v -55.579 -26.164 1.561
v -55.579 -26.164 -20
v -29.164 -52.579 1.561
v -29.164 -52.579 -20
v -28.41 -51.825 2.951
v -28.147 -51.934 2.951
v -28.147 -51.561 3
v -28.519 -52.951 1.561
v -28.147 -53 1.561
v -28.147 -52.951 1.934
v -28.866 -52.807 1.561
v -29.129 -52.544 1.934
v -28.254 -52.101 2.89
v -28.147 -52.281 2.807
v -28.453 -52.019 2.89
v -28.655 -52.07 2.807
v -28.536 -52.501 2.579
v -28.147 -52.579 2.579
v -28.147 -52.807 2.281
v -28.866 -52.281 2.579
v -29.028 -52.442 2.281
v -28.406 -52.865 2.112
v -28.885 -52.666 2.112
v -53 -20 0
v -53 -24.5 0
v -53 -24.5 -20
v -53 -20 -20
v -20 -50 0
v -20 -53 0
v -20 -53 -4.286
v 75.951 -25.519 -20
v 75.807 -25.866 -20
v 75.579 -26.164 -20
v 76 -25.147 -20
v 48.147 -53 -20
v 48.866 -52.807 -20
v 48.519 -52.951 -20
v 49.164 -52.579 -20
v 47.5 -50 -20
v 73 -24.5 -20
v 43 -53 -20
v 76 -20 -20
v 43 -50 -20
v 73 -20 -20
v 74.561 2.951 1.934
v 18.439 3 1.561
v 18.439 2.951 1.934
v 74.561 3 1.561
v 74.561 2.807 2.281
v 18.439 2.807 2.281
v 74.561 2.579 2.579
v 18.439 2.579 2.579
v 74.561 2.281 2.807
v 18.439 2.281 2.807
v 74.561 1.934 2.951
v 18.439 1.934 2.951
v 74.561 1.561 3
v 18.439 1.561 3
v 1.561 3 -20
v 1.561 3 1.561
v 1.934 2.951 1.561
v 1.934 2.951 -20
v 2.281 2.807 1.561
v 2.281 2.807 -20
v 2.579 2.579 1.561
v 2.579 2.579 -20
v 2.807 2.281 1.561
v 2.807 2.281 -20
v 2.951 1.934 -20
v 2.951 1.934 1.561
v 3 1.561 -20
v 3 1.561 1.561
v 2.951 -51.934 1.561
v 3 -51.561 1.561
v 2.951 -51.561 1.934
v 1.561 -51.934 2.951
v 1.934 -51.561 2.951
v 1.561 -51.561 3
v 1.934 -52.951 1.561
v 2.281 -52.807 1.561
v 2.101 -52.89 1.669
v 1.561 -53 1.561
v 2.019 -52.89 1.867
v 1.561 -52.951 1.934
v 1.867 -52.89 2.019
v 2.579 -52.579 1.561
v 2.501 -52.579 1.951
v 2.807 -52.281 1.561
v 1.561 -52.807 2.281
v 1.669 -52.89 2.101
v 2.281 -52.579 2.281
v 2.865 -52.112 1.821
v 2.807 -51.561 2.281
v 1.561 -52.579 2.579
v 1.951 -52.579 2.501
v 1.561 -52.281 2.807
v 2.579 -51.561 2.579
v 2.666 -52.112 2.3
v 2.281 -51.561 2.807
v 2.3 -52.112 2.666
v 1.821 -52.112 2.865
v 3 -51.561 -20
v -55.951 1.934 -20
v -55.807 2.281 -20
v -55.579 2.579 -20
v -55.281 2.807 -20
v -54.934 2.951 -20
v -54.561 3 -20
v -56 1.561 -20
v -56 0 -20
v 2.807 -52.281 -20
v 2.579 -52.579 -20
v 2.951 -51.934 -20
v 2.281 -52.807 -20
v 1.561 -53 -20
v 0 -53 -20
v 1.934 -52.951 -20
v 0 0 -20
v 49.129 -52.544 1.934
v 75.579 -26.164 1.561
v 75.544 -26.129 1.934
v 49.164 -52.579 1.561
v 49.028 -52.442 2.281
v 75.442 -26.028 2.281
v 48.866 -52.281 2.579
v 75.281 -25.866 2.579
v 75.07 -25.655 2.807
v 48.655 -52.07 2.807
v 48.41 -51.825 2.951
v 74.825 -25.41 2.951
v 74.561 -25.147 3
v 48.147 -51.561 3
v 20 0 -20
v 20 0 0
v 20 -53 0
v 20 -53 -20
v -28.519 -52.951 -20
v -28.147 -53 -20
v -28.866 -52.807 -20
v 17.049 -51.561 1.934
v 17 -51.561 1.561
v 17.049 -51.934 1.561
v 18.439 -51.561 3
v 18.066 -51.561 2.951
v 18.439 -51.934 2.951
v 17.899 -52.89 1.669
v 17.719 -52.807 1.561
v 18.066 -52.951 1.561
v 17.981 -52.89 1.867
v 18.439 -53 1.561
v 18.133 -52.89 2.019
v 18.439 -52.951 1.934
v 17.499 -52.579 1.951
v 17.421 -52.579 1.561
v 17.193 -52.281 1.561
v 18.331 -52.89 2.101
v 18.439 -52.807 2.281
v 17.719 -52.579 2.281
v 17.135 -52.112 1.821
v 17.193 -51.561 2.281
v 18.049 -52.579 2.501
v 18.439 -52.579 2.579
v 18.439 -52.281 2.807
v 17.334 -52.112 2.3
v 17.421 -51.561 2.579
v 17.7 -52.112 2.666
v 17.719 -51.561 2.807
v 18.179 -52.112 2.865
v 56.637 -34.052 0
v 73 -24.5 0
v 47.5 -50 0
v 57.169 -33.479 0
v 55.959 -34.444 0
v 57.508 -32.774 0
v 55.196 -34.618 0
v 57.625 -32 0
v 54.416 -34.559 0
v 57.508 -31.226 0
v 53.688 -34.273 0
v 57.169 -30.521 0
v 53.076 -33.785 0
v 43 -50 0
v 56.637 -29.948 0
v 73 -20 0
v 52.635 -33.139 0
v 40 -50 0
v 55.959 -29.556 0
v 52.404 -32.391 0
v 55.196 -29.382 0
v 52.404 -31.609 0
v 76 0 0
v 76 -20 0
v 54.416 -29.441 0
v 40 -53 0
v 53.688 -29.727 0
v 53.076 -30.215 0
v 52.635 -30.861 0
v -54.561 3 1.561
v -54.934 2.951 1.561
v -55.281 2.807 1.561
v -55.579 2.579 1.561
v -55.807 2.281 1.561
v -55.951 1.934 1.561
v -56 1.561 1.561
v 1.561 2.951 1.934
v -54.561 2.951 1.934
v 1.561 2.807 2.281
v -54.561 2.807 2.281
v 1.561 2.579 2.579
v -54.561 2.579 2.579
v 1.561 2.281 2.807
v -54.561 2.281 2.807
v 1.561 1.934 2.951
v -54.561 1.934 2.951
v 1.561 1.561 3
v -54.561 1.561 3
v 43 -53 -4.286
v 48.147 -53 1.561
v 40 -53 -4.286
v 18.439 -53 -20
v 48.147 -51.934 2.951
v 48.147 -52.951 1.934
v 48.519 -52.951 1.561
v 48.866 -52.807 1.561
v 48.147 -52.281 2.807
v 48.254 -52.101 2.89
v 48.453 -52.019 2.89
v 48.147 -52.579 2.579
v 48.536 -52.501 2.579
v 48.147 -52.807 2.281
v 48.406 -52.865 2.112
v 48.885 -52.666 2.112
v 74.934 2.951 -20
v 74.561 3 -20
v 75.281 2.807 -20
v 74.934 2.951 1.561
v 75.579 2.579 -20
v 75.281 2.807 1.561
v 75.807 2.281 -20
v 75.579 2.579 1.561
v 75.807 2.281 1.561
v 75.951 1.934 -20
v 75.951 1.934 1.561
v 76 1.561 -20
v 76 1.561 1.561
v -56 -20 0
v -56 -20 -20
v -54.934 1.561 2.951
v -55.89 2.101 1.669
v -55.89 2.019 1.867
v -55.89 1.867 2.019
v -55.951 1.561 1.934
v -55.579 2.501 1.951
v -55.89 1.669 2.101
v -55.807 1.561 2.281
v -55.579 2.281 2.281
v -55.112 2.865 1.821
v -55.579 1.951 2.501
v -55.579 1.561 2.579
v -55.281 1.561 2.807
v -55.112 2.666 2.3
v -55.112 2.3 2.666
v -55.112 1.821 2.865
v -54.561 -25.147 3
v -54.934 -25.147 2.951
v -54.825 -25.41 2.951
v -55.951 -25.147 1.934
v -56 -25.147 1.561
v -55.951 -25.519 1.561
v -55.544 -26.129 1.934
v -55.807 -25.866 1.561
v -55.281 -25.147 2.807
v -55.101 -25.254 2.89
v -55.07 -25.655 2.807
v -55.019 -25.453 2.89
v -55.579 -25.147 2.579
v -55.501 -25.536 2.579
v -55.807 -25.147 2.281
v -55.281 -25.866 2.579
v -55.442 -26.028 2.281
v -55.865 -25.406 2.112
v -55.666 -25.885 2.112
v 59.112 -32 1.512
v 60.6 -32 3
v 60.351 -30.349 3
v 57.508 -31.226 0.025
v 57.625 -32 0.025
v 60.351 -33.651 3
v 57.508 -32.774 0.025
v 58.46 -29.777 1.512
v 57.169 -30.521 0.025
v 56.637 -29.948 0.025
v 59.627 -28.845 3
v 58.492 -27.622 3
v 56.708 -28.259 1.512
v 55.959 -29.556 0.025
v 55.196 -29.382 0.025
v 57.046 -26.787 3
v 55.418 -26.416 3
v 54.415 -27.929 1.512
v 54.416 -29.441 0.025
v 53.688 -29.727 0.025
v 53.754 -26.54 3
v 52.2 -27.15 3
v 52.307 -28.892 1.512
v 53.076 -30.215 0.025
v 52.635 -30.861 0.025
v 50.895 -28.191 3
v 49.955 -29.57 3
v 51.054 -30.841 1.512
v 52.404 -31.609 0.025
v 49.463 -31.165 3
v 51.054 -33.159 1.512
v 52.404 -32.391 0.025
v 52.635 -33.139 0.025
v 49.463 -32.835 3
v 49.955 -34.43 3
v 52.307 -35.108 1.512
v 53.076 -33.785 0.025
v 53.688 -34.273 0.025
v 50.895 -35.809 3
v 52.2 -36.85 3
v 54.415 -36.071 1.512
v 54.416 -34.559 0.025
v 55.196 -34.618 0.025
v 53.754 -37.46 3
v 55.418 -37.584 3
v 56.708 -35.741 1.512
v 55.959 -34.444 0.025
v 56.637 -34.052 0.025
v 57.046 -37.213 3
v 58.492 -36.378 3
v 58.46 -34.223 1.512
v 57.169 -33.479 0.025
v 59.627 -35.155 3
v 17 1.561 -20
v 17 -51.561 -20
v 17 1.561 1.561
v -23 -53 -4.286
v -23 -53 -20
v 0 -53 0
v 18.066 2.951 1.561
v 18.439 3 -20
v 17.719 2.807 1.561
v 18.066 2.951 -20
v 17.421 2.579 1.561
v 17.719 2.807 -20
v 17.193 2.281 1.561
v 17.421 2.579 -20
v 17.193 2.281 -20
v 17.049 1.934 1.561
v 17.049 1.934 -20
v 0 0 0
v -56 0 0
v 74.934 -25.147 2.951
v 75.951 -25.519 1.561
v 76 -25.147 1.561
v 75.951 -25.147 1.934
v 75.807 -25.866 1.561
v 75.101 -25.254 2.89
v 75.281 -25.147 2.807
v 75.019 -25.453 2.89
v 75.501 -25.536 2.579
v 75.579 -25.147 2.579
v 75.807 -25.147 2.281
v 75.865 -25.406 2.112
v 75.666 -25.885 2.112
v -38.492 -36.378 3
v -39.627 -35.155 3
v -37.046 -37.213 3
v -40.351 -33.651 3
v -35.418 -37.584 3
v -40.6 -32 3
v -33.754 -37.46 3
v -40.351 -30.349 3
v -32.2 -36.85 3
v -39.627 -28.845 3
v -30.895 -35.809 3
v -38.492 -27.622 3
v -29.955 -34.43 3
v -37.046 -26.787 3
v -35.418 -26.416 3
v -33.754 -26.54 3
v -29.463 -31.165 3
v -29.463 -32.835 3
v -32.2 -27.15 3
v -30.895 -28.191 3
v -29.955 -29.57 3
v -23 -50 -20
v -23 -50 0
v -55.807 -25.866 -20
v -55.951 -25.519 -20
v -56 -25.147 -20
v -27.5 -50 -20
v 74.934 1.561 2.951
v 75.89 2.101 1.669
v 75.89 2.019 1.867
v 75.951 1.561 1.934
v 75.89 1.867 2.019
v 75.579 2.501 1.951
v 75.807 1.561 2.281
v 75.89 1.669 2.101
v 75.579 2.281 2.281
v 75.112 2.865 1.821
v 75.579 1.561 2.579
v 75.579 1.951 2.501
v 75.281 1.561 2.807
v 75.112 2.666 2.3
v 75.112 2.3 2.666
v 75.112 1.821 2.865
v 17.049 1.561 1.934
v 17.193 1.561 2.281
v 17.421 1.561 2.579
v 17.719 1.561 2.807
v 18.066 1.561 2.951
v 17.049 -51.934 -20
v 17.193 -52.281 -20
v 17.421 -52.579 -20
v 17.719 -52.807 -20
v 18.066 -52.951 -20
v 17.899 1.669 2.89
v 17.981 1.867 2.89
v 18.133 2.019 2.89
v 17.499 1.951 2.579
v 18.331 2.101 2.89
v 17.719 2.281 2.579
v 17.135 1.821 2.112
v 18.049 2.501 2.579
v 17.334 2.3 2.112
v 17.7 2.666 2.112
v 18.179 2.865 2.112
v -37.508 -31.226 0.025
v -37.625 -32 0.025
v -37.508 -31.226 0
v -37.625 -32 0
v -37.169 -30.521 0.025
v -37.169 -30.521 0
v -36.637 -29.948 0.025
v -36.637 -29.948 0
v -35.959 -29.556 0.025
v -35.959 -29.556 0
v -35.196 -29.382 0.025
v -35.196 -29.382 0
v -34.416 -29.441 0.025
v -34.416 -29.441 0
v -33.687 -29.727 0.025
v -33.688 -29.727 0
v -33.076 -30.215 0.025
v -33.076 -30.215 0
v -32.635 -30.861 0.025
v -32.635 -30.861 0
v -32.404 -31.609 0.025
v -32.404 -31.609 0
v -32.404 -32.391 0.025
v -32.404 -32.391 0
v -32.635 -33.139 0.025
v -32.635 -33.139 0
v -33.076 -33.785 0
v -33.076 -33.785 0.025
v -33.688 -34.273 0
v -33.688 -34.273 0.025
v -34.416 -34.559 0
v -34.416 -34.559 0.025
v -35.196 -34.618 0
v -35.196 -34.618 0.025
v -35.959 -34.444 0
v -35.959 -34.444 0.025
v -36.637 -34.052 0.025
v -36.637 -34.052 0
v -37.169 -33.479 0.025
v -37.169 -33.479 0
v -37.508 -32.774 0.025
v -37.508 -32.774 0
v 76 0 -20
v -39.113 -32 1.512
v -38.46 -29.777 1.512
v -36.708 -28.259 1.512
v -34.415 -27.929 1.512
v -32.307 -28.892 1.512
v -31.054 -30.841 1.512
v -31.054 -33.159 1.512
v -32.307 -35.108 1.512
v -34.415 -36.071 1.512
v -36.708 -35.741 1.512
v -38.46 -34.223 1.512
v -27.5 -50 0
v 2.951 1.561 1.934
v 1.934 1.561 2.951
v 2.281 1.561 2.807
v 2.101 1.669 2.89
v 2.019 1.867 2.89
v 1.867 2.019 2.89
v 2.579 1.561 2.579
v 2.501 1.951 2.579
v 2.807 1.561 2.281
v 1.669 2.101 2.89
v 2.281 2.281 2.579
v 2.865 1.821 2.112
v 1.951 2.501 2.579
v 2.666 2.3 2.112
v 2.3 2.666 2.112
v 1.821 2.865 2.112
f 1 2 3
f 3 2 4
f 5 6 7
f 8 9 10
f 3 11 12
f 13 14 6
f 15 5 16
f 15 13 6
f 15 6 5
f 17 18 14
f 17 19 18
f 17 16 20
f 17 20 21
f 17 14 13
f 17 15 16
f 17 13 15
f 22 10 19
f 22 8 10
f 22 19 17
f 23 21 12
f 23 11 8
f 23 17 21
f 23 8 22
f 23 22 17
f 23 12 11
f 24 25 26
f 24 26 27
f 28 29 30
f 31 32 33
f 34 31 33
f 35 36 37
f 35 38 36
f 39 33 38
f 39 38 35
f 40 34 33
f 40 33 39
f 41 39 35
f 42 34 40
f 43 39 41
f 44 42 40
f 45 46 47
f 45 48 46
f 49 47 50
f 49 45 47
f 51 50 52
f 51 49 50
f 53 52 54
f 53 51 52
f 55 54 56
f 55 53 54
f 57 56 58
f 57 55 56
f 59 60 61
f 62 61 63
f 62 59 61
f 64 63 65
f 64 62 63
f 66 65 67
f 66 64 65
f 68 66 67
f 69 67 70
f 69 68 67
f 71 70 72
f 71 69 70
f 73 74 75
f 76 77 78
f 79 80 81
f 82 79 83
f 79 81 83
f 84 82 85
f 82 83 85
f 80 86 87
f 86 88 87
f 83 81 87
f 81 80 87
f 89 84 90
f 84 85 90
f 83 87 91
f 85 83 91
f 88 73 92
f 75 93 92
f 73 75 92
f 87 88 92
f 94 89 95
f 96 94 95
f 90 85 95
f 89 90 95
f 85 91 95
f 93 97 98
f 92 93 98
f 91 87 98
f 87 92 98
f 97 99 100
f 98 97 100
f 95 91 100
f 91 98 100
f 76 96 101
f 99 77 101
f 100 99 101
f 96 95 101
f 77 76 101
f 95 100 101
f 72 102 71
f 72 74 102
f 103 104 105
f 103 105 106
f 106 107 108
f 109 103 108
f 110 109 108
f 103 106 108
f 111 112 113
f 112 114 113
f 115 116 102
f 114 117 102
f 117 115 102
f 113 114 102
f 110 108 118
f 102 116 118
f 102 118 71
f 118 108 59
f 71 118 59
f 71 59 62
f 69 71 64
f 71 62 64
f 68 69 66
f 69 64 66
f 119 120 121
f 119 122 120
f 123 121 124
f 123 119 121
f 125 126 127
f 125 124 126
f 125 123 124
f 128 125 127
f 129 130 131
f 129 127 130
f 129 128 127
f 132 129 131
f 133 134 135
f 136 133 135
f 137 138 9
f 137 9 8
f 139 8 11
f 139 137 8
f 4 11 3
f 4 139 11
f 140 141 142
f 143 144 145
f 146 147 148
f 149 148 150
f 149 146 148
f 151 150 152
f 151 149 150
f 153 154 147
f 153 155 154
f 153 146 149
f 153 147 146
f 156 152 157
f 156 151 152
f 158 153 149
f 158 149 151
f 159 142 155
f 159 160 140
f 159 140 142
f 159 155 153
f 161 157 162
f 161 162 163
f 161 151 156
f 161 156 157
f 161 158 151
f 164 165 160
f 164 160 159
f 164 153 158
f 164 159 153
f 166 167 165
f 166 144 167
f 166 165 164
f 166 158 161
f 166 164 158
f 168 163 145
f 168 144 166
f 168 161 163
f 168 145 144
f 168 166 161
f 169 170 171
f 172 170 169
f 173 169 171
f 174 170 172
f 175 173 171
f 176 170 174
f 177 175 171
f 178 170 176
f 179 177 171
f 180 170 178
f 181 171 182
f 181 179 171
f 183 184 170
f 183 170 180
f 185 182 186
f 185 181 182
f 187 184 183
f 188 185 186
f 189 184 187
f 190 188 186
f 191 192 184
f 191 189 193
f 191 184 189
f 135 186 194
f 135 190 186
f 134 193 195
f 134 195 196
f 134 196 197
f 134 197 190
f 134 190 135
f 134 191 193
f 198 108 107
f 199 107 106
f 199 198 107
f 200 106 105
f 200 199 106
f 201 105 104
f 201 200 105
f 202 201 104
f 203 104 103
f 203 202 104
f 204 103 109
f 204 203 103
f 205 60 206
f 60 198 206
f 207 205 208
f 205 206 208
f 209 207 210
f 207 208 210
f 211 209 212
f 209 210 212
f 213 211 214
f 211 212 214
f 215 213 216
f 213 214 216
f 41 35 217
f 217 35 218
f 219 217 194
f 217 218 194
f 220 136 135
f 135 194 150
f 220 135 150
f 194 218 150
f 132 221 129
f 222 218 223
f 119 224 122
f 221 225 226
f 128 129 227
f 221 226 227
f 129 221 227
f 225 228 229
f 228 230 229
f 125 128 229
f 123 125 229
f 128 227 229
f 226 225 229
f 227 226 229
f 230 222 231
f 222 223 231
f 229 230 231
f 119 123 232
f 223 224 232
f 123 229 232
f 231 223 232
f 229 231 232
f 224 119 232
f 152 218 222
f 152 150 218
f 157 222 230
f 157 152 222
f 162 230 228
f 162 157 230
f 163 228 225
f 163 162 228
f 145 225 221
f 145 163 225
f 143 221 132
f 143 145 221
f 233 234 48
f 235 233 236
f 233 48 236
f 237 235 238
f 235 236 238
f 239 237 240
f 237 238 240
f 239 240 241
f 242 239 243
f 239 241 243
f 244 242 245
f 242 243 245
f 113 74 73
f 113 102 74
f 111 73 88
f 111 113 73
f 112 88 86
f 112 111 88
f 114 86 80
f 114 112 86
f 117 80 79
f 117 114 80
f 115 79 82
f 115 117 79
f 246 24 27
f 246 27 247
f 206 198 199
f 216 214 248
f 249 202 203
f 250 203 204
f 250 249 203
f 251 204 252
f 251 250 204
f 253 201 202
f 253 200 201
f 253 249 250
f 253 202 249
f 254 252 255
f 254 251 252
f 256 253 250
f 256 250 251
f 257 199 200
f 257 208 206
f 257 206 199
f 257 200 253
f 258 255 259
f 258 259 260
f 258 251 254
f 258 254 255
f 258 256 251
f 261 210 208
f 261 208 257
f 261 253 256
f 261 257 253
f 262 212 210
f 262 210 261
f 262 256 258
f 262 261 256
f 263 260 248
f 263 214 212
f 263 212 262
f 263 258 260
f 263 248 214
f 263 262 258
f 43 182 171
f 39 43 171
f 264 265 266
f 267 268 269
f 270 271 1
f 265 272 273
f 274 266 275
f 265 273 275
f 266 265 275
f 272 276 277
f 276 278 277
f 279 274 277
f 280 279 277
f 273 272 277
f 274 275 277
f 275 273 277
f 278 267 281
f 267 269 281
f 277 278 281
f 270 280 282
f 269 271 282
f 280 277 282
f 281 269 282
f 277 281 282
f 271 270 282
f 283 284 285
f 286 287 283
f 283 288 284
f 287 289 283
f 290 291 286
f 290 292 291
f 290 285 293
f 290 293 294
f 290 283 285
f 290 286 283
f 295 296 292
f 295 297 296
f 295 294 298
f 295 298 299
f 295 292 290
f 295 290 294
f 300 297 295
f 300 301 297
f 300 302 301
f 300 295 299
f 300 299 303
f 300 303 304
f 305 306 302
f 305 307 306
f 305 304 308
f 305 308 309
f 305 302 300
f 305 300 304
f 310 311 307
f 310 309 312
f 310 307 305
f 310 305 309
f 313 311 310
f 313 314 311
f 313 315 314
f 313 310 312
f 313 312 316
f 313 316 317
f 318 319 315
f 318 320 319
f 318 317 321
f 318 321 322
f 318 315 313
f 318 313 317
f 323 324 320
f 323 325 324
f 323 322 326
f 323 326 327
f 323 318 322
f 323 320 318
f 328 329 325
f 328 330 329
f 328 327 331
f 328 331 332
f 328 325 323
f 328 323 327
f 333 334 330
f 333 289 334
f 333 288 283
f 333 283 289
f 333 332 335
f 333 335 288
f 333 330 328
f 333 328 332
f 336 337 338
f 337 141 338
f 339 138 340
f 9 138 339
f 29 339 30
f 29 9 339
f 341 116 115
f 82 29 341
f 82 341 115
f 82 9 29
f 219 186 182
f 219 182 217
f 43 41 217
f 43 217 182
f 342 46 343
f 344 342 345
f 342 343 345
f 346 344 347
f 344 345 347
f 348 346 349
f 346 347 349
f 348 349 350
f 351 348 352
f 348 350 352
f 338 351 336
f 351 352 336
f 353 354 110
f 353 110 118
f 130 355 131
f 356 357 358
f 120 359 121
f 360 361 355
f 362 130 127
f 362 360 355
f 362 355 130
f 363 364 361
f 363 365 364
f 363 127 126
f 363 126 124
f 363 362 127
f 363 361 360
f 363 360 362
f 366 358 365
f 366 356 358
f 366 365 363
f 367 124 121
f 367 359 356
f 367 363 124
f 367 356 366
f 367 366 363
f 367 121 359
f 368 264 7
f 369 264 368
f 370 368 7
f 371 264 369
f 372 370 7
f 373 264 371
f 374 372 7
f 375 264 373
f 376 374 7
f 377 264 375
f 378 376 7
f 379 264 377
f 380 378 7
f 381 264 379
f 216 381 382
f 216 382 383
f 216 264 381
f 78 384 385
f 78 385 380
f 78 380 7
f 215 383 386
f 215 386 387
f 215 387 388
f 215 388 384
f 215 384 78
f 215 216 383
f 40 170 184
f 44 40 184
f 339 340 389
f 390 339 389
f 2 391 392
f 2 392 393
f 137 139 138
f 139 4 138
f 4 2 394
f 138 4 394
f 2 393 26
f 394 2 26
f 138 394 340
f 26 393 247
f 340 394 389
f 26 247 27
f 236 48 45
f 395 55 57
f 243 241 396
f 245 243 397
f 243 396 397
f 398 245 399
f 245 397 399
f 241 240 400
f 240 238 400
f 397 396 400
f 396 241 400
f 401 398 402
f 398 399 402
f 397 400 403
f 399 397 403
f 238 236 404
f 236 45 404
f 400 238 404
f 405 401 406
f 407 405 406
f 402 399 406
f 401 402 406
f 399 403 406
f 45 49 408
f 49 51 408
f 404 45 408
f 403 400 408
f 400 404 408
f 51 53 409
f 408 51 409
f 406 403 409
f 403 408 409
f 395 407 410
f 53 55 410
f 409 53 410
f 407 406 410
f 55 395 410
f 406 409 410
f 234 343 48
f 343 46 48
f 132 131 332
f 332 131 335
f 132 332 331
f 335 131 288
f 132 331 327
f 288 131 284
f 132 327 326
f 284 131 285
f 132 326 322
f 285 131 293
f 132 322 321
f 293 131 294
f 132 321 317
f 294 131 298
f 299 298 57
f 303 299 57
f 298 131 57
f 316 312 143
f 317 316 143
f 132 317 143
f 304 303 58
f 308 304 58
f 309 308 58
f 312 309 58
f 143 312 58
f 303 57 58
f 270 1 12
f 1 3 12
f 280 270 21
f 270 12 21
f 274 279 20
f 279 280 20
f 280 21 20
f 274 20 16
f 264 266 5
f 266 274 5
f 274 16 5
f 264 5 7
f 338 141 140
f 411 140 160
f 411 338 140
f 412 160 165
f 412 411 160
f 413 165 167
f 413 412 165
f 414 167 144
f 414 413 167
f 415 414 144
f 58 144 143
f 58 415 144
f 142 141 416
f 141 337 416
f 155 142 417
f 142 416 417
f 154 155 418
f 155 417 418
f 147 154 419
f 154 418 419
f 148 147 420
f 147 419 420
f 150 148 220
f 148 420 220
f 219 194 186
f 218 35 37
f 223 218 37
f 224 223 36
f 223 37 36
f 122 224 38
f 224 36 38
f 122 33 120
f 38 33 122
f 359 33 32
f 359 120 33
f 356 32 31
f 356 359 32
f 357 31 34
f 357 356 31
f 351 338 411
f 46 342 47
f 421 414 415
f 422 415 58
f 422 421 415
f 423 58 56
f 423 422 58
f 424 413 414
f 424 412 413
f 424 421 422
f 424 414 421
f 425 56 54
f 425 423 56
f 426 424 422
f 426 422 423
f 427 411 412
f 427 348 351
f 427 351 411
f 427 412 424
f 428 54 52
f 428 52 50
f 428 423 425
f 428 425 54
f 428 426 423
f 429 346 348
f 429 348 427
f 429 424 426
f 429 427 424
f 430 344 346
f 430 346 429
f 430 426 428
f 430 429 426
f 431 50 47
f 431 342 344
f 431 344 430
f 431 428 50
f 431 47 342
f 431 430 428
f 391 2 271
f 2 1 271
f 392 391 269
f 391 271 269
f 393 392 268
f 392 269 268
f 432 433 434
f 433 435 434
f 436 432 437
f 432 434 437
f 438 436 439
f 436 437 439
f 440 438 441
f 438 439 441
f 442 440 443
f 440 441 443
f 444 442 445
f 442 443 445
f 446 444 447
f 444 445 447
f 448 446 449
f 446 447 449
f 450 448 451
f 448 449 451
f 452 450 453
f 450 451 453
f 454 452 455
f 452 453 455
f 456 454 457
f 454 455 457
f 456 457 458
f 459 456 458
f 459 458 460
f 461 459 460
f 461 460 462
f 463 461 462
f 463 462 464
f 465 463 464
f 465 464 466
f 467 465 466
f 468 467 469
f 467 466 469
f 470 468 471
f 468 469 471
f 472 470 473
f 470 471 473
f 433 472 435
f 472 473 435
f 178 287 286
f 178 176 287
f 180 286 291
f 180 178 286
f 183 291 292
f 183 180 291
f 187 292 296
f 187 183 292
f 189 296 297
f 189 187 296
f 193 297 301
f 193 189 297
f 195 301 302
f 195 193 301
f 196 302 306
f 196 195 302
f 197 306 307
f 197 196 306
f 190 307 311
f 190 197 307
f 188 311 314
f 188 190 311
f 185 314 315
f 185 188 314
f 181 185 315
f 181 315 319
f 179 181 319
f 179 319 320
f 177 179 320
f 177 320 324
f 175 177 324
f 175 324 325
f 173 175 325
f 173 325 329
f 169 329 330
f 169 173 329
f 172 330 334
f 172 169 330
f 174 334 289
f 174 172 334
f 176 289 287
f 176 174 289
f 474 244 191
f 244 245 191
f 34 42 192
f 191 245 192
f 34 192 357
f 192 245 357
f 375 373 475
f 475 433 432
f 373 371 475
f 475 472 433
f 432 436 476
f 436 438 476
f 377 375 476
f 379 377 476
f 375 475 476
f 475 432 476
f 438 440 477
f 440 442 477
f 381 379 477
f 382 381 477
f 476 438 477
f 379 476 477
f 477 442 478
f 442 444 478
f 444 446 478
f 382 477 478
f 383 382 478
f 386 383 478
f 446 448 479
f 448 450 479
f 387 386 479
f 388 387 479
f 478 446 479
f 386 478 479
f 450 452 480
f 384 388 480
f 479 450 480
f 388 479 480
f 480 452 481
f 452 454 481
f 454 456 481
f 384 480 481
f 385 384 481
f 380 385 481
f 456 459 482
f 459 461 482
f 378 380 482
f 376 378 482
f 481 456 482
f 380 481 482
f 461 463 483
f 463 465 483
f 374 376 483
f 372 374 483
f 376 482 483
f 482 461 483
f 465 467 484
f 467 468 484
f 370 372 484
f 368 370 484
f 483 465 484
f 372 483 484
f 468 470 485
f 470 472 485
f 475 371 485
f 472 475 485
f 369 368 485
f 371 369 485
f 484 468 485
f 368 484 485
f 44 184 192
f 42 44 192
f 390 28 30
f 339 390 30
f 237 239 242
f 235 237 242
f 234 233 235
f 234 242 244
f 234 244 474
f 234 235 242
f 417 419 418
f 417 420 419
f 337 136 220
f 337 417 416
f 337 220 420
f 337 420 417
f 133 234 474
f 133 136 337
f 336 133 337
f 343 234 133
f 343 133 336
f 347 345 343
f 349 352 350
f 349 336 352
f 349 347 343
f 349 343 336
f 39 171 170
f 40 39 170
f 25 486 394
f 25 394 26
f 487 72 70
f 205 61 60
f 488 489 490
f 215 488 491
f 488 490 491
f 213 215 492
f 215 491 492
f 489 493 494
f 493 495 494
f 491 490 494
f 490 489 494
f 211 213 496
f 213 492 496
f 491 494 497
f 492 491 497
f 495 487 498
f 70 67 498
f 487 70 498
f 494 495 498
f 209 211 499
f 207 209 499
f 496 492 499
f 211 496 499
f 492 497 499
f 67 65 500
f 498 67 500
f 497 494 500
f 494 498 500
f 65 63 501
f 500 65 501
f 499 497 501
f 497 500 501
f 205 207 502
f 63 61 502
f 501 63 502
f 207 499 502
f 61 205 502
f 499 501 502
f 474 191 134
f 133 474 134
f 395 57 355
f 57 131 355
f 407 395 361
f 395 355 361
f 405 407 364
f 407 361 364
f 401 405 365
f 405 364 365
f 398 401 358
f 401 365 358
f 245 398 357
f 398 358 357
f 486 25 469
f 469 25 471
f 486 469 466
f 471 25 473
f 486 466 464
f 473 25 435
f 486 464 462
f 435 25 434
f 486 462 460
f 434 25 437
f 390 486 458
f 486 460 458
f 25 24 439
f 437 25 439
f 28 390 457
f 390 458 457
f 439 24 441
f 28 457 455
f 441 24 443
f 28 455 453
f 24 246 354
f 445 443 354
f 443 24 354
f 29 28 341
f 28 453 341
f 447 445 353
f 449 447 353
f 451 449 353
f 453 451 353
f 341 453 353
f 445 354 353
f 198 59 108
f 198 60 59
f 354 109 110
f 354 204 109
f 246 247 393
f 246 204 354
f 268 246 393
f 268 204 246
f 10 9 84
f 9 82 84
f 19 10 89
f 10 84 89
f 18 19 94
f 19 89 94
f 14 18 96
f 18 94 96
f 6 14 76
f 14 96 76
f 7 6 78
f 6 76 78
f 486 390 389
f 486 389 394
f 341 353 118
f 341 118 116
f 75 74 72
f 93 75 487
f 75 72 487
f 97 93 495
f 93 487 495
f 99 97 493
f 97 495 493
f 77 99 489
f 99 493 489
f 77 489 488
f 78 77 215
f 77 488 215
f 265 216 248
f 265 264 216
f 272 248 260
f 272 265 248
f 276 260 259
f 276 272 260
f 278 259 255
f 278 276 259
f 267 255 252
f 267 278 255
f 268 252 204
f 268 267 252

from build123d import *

# Parameters (mm, degrees)
F1_DEPTH       = 3
F2_DEPTH       = 20
F3_R           = 1.4387747146
F5_D           = 5.25
F5_DEPTH       = 6
F5_CSINK_D     = 11.2
F5_CSINK_ANGLE = 90
F5_TIP         = 1.5772591249
F8_DEPTH       = 3


with BuildPart() as f1:
    # F0 (on Top) → F1 (new body)
    with BuildSketch(Plane.XY):
        Polygon((3, 3), (-56, 3), (-56, 0), (0, 0), (0, -53), (3, -53), align=None)
        Polygon((0, 0), (-56, 0), (-56, -20), (-53, -20), (-53, -24.5), (-27.5, -50), (-20, -50), (-20, -53), (0, -53), align=None)
        Polygon((-53, -20), (-56, -20), (-56, -25.7426406871), (-28.7426406871, -53), (-20, -53), (-20, -50), (-27.5, -50), (-53, -24.5), align=None)
    extrude(amount=F1_DEPTH)

    # F0 (on Top) → F2 (join)
    with BuildSketch(Plane.XY):
        Polygon((3, 3), (-56, 3), (-56, 0), (0, 0), (0, -53), (3, -53), align=None)
        Polygon((-53, -20), (-56, -20), (-56, -25.7426406871), (-28.7426406871, -53), (-20, -53), (-20, -50), (-27.5, -50), (-53, -24.5), align=None)
    extrude(amount=-F2_DEPTH)

    # F3
    f3_edges = [f1.edges().sort_by_distance(p)[0] for p in [
        (3, 3, -8.5),
        (3, -25, 3),
        (-26.5, 3, 3),
        (-42.37132, -39.37132, 3),
        (-28.742641, -53, -8.5),
        (-56, -25.742641, -8.5),
        (3, -53, -8.5),
        (-56, 3, -8.5),
        (-56, -11.37132, 3),
        (-12.87132, -53, 3),
    ]]
    fillet(f3_edges, radius=F3_R)

    # F5
    with Locations(Plane.XY.offset(3)):
        with Locations((-35, -32)):
            CounterSinkHole(F5_D / 2, F5_CSINK_D / 2, depth=F5_DEPTH, counter_sink_angle=F5_CSINK_ANGLE)
            with Locations((0, 0, -(F5_DEPTH + F5_TIP / 2))):  # 118° drill point
                Cone(0, F5_D / 2, F5_TIP, mode=Mode.SUBTRACT)

    # F7 (on face) → F8 (cut)
    with BuildSketch(Plane.YZ.offset(-20)):
        Polygon((-50, -20), (-50, 0), (-64, -20), align=None)
    extrude(amount=-F8_DEPTH, mode=Mode.SUBTRACT)


with BuildPart() as f9_1:
    # F9: instance of F1
    add(f1.part.mirror(Plane.YZ.offset(10)))


solid = Compound([f1.part, f9_1.part])
